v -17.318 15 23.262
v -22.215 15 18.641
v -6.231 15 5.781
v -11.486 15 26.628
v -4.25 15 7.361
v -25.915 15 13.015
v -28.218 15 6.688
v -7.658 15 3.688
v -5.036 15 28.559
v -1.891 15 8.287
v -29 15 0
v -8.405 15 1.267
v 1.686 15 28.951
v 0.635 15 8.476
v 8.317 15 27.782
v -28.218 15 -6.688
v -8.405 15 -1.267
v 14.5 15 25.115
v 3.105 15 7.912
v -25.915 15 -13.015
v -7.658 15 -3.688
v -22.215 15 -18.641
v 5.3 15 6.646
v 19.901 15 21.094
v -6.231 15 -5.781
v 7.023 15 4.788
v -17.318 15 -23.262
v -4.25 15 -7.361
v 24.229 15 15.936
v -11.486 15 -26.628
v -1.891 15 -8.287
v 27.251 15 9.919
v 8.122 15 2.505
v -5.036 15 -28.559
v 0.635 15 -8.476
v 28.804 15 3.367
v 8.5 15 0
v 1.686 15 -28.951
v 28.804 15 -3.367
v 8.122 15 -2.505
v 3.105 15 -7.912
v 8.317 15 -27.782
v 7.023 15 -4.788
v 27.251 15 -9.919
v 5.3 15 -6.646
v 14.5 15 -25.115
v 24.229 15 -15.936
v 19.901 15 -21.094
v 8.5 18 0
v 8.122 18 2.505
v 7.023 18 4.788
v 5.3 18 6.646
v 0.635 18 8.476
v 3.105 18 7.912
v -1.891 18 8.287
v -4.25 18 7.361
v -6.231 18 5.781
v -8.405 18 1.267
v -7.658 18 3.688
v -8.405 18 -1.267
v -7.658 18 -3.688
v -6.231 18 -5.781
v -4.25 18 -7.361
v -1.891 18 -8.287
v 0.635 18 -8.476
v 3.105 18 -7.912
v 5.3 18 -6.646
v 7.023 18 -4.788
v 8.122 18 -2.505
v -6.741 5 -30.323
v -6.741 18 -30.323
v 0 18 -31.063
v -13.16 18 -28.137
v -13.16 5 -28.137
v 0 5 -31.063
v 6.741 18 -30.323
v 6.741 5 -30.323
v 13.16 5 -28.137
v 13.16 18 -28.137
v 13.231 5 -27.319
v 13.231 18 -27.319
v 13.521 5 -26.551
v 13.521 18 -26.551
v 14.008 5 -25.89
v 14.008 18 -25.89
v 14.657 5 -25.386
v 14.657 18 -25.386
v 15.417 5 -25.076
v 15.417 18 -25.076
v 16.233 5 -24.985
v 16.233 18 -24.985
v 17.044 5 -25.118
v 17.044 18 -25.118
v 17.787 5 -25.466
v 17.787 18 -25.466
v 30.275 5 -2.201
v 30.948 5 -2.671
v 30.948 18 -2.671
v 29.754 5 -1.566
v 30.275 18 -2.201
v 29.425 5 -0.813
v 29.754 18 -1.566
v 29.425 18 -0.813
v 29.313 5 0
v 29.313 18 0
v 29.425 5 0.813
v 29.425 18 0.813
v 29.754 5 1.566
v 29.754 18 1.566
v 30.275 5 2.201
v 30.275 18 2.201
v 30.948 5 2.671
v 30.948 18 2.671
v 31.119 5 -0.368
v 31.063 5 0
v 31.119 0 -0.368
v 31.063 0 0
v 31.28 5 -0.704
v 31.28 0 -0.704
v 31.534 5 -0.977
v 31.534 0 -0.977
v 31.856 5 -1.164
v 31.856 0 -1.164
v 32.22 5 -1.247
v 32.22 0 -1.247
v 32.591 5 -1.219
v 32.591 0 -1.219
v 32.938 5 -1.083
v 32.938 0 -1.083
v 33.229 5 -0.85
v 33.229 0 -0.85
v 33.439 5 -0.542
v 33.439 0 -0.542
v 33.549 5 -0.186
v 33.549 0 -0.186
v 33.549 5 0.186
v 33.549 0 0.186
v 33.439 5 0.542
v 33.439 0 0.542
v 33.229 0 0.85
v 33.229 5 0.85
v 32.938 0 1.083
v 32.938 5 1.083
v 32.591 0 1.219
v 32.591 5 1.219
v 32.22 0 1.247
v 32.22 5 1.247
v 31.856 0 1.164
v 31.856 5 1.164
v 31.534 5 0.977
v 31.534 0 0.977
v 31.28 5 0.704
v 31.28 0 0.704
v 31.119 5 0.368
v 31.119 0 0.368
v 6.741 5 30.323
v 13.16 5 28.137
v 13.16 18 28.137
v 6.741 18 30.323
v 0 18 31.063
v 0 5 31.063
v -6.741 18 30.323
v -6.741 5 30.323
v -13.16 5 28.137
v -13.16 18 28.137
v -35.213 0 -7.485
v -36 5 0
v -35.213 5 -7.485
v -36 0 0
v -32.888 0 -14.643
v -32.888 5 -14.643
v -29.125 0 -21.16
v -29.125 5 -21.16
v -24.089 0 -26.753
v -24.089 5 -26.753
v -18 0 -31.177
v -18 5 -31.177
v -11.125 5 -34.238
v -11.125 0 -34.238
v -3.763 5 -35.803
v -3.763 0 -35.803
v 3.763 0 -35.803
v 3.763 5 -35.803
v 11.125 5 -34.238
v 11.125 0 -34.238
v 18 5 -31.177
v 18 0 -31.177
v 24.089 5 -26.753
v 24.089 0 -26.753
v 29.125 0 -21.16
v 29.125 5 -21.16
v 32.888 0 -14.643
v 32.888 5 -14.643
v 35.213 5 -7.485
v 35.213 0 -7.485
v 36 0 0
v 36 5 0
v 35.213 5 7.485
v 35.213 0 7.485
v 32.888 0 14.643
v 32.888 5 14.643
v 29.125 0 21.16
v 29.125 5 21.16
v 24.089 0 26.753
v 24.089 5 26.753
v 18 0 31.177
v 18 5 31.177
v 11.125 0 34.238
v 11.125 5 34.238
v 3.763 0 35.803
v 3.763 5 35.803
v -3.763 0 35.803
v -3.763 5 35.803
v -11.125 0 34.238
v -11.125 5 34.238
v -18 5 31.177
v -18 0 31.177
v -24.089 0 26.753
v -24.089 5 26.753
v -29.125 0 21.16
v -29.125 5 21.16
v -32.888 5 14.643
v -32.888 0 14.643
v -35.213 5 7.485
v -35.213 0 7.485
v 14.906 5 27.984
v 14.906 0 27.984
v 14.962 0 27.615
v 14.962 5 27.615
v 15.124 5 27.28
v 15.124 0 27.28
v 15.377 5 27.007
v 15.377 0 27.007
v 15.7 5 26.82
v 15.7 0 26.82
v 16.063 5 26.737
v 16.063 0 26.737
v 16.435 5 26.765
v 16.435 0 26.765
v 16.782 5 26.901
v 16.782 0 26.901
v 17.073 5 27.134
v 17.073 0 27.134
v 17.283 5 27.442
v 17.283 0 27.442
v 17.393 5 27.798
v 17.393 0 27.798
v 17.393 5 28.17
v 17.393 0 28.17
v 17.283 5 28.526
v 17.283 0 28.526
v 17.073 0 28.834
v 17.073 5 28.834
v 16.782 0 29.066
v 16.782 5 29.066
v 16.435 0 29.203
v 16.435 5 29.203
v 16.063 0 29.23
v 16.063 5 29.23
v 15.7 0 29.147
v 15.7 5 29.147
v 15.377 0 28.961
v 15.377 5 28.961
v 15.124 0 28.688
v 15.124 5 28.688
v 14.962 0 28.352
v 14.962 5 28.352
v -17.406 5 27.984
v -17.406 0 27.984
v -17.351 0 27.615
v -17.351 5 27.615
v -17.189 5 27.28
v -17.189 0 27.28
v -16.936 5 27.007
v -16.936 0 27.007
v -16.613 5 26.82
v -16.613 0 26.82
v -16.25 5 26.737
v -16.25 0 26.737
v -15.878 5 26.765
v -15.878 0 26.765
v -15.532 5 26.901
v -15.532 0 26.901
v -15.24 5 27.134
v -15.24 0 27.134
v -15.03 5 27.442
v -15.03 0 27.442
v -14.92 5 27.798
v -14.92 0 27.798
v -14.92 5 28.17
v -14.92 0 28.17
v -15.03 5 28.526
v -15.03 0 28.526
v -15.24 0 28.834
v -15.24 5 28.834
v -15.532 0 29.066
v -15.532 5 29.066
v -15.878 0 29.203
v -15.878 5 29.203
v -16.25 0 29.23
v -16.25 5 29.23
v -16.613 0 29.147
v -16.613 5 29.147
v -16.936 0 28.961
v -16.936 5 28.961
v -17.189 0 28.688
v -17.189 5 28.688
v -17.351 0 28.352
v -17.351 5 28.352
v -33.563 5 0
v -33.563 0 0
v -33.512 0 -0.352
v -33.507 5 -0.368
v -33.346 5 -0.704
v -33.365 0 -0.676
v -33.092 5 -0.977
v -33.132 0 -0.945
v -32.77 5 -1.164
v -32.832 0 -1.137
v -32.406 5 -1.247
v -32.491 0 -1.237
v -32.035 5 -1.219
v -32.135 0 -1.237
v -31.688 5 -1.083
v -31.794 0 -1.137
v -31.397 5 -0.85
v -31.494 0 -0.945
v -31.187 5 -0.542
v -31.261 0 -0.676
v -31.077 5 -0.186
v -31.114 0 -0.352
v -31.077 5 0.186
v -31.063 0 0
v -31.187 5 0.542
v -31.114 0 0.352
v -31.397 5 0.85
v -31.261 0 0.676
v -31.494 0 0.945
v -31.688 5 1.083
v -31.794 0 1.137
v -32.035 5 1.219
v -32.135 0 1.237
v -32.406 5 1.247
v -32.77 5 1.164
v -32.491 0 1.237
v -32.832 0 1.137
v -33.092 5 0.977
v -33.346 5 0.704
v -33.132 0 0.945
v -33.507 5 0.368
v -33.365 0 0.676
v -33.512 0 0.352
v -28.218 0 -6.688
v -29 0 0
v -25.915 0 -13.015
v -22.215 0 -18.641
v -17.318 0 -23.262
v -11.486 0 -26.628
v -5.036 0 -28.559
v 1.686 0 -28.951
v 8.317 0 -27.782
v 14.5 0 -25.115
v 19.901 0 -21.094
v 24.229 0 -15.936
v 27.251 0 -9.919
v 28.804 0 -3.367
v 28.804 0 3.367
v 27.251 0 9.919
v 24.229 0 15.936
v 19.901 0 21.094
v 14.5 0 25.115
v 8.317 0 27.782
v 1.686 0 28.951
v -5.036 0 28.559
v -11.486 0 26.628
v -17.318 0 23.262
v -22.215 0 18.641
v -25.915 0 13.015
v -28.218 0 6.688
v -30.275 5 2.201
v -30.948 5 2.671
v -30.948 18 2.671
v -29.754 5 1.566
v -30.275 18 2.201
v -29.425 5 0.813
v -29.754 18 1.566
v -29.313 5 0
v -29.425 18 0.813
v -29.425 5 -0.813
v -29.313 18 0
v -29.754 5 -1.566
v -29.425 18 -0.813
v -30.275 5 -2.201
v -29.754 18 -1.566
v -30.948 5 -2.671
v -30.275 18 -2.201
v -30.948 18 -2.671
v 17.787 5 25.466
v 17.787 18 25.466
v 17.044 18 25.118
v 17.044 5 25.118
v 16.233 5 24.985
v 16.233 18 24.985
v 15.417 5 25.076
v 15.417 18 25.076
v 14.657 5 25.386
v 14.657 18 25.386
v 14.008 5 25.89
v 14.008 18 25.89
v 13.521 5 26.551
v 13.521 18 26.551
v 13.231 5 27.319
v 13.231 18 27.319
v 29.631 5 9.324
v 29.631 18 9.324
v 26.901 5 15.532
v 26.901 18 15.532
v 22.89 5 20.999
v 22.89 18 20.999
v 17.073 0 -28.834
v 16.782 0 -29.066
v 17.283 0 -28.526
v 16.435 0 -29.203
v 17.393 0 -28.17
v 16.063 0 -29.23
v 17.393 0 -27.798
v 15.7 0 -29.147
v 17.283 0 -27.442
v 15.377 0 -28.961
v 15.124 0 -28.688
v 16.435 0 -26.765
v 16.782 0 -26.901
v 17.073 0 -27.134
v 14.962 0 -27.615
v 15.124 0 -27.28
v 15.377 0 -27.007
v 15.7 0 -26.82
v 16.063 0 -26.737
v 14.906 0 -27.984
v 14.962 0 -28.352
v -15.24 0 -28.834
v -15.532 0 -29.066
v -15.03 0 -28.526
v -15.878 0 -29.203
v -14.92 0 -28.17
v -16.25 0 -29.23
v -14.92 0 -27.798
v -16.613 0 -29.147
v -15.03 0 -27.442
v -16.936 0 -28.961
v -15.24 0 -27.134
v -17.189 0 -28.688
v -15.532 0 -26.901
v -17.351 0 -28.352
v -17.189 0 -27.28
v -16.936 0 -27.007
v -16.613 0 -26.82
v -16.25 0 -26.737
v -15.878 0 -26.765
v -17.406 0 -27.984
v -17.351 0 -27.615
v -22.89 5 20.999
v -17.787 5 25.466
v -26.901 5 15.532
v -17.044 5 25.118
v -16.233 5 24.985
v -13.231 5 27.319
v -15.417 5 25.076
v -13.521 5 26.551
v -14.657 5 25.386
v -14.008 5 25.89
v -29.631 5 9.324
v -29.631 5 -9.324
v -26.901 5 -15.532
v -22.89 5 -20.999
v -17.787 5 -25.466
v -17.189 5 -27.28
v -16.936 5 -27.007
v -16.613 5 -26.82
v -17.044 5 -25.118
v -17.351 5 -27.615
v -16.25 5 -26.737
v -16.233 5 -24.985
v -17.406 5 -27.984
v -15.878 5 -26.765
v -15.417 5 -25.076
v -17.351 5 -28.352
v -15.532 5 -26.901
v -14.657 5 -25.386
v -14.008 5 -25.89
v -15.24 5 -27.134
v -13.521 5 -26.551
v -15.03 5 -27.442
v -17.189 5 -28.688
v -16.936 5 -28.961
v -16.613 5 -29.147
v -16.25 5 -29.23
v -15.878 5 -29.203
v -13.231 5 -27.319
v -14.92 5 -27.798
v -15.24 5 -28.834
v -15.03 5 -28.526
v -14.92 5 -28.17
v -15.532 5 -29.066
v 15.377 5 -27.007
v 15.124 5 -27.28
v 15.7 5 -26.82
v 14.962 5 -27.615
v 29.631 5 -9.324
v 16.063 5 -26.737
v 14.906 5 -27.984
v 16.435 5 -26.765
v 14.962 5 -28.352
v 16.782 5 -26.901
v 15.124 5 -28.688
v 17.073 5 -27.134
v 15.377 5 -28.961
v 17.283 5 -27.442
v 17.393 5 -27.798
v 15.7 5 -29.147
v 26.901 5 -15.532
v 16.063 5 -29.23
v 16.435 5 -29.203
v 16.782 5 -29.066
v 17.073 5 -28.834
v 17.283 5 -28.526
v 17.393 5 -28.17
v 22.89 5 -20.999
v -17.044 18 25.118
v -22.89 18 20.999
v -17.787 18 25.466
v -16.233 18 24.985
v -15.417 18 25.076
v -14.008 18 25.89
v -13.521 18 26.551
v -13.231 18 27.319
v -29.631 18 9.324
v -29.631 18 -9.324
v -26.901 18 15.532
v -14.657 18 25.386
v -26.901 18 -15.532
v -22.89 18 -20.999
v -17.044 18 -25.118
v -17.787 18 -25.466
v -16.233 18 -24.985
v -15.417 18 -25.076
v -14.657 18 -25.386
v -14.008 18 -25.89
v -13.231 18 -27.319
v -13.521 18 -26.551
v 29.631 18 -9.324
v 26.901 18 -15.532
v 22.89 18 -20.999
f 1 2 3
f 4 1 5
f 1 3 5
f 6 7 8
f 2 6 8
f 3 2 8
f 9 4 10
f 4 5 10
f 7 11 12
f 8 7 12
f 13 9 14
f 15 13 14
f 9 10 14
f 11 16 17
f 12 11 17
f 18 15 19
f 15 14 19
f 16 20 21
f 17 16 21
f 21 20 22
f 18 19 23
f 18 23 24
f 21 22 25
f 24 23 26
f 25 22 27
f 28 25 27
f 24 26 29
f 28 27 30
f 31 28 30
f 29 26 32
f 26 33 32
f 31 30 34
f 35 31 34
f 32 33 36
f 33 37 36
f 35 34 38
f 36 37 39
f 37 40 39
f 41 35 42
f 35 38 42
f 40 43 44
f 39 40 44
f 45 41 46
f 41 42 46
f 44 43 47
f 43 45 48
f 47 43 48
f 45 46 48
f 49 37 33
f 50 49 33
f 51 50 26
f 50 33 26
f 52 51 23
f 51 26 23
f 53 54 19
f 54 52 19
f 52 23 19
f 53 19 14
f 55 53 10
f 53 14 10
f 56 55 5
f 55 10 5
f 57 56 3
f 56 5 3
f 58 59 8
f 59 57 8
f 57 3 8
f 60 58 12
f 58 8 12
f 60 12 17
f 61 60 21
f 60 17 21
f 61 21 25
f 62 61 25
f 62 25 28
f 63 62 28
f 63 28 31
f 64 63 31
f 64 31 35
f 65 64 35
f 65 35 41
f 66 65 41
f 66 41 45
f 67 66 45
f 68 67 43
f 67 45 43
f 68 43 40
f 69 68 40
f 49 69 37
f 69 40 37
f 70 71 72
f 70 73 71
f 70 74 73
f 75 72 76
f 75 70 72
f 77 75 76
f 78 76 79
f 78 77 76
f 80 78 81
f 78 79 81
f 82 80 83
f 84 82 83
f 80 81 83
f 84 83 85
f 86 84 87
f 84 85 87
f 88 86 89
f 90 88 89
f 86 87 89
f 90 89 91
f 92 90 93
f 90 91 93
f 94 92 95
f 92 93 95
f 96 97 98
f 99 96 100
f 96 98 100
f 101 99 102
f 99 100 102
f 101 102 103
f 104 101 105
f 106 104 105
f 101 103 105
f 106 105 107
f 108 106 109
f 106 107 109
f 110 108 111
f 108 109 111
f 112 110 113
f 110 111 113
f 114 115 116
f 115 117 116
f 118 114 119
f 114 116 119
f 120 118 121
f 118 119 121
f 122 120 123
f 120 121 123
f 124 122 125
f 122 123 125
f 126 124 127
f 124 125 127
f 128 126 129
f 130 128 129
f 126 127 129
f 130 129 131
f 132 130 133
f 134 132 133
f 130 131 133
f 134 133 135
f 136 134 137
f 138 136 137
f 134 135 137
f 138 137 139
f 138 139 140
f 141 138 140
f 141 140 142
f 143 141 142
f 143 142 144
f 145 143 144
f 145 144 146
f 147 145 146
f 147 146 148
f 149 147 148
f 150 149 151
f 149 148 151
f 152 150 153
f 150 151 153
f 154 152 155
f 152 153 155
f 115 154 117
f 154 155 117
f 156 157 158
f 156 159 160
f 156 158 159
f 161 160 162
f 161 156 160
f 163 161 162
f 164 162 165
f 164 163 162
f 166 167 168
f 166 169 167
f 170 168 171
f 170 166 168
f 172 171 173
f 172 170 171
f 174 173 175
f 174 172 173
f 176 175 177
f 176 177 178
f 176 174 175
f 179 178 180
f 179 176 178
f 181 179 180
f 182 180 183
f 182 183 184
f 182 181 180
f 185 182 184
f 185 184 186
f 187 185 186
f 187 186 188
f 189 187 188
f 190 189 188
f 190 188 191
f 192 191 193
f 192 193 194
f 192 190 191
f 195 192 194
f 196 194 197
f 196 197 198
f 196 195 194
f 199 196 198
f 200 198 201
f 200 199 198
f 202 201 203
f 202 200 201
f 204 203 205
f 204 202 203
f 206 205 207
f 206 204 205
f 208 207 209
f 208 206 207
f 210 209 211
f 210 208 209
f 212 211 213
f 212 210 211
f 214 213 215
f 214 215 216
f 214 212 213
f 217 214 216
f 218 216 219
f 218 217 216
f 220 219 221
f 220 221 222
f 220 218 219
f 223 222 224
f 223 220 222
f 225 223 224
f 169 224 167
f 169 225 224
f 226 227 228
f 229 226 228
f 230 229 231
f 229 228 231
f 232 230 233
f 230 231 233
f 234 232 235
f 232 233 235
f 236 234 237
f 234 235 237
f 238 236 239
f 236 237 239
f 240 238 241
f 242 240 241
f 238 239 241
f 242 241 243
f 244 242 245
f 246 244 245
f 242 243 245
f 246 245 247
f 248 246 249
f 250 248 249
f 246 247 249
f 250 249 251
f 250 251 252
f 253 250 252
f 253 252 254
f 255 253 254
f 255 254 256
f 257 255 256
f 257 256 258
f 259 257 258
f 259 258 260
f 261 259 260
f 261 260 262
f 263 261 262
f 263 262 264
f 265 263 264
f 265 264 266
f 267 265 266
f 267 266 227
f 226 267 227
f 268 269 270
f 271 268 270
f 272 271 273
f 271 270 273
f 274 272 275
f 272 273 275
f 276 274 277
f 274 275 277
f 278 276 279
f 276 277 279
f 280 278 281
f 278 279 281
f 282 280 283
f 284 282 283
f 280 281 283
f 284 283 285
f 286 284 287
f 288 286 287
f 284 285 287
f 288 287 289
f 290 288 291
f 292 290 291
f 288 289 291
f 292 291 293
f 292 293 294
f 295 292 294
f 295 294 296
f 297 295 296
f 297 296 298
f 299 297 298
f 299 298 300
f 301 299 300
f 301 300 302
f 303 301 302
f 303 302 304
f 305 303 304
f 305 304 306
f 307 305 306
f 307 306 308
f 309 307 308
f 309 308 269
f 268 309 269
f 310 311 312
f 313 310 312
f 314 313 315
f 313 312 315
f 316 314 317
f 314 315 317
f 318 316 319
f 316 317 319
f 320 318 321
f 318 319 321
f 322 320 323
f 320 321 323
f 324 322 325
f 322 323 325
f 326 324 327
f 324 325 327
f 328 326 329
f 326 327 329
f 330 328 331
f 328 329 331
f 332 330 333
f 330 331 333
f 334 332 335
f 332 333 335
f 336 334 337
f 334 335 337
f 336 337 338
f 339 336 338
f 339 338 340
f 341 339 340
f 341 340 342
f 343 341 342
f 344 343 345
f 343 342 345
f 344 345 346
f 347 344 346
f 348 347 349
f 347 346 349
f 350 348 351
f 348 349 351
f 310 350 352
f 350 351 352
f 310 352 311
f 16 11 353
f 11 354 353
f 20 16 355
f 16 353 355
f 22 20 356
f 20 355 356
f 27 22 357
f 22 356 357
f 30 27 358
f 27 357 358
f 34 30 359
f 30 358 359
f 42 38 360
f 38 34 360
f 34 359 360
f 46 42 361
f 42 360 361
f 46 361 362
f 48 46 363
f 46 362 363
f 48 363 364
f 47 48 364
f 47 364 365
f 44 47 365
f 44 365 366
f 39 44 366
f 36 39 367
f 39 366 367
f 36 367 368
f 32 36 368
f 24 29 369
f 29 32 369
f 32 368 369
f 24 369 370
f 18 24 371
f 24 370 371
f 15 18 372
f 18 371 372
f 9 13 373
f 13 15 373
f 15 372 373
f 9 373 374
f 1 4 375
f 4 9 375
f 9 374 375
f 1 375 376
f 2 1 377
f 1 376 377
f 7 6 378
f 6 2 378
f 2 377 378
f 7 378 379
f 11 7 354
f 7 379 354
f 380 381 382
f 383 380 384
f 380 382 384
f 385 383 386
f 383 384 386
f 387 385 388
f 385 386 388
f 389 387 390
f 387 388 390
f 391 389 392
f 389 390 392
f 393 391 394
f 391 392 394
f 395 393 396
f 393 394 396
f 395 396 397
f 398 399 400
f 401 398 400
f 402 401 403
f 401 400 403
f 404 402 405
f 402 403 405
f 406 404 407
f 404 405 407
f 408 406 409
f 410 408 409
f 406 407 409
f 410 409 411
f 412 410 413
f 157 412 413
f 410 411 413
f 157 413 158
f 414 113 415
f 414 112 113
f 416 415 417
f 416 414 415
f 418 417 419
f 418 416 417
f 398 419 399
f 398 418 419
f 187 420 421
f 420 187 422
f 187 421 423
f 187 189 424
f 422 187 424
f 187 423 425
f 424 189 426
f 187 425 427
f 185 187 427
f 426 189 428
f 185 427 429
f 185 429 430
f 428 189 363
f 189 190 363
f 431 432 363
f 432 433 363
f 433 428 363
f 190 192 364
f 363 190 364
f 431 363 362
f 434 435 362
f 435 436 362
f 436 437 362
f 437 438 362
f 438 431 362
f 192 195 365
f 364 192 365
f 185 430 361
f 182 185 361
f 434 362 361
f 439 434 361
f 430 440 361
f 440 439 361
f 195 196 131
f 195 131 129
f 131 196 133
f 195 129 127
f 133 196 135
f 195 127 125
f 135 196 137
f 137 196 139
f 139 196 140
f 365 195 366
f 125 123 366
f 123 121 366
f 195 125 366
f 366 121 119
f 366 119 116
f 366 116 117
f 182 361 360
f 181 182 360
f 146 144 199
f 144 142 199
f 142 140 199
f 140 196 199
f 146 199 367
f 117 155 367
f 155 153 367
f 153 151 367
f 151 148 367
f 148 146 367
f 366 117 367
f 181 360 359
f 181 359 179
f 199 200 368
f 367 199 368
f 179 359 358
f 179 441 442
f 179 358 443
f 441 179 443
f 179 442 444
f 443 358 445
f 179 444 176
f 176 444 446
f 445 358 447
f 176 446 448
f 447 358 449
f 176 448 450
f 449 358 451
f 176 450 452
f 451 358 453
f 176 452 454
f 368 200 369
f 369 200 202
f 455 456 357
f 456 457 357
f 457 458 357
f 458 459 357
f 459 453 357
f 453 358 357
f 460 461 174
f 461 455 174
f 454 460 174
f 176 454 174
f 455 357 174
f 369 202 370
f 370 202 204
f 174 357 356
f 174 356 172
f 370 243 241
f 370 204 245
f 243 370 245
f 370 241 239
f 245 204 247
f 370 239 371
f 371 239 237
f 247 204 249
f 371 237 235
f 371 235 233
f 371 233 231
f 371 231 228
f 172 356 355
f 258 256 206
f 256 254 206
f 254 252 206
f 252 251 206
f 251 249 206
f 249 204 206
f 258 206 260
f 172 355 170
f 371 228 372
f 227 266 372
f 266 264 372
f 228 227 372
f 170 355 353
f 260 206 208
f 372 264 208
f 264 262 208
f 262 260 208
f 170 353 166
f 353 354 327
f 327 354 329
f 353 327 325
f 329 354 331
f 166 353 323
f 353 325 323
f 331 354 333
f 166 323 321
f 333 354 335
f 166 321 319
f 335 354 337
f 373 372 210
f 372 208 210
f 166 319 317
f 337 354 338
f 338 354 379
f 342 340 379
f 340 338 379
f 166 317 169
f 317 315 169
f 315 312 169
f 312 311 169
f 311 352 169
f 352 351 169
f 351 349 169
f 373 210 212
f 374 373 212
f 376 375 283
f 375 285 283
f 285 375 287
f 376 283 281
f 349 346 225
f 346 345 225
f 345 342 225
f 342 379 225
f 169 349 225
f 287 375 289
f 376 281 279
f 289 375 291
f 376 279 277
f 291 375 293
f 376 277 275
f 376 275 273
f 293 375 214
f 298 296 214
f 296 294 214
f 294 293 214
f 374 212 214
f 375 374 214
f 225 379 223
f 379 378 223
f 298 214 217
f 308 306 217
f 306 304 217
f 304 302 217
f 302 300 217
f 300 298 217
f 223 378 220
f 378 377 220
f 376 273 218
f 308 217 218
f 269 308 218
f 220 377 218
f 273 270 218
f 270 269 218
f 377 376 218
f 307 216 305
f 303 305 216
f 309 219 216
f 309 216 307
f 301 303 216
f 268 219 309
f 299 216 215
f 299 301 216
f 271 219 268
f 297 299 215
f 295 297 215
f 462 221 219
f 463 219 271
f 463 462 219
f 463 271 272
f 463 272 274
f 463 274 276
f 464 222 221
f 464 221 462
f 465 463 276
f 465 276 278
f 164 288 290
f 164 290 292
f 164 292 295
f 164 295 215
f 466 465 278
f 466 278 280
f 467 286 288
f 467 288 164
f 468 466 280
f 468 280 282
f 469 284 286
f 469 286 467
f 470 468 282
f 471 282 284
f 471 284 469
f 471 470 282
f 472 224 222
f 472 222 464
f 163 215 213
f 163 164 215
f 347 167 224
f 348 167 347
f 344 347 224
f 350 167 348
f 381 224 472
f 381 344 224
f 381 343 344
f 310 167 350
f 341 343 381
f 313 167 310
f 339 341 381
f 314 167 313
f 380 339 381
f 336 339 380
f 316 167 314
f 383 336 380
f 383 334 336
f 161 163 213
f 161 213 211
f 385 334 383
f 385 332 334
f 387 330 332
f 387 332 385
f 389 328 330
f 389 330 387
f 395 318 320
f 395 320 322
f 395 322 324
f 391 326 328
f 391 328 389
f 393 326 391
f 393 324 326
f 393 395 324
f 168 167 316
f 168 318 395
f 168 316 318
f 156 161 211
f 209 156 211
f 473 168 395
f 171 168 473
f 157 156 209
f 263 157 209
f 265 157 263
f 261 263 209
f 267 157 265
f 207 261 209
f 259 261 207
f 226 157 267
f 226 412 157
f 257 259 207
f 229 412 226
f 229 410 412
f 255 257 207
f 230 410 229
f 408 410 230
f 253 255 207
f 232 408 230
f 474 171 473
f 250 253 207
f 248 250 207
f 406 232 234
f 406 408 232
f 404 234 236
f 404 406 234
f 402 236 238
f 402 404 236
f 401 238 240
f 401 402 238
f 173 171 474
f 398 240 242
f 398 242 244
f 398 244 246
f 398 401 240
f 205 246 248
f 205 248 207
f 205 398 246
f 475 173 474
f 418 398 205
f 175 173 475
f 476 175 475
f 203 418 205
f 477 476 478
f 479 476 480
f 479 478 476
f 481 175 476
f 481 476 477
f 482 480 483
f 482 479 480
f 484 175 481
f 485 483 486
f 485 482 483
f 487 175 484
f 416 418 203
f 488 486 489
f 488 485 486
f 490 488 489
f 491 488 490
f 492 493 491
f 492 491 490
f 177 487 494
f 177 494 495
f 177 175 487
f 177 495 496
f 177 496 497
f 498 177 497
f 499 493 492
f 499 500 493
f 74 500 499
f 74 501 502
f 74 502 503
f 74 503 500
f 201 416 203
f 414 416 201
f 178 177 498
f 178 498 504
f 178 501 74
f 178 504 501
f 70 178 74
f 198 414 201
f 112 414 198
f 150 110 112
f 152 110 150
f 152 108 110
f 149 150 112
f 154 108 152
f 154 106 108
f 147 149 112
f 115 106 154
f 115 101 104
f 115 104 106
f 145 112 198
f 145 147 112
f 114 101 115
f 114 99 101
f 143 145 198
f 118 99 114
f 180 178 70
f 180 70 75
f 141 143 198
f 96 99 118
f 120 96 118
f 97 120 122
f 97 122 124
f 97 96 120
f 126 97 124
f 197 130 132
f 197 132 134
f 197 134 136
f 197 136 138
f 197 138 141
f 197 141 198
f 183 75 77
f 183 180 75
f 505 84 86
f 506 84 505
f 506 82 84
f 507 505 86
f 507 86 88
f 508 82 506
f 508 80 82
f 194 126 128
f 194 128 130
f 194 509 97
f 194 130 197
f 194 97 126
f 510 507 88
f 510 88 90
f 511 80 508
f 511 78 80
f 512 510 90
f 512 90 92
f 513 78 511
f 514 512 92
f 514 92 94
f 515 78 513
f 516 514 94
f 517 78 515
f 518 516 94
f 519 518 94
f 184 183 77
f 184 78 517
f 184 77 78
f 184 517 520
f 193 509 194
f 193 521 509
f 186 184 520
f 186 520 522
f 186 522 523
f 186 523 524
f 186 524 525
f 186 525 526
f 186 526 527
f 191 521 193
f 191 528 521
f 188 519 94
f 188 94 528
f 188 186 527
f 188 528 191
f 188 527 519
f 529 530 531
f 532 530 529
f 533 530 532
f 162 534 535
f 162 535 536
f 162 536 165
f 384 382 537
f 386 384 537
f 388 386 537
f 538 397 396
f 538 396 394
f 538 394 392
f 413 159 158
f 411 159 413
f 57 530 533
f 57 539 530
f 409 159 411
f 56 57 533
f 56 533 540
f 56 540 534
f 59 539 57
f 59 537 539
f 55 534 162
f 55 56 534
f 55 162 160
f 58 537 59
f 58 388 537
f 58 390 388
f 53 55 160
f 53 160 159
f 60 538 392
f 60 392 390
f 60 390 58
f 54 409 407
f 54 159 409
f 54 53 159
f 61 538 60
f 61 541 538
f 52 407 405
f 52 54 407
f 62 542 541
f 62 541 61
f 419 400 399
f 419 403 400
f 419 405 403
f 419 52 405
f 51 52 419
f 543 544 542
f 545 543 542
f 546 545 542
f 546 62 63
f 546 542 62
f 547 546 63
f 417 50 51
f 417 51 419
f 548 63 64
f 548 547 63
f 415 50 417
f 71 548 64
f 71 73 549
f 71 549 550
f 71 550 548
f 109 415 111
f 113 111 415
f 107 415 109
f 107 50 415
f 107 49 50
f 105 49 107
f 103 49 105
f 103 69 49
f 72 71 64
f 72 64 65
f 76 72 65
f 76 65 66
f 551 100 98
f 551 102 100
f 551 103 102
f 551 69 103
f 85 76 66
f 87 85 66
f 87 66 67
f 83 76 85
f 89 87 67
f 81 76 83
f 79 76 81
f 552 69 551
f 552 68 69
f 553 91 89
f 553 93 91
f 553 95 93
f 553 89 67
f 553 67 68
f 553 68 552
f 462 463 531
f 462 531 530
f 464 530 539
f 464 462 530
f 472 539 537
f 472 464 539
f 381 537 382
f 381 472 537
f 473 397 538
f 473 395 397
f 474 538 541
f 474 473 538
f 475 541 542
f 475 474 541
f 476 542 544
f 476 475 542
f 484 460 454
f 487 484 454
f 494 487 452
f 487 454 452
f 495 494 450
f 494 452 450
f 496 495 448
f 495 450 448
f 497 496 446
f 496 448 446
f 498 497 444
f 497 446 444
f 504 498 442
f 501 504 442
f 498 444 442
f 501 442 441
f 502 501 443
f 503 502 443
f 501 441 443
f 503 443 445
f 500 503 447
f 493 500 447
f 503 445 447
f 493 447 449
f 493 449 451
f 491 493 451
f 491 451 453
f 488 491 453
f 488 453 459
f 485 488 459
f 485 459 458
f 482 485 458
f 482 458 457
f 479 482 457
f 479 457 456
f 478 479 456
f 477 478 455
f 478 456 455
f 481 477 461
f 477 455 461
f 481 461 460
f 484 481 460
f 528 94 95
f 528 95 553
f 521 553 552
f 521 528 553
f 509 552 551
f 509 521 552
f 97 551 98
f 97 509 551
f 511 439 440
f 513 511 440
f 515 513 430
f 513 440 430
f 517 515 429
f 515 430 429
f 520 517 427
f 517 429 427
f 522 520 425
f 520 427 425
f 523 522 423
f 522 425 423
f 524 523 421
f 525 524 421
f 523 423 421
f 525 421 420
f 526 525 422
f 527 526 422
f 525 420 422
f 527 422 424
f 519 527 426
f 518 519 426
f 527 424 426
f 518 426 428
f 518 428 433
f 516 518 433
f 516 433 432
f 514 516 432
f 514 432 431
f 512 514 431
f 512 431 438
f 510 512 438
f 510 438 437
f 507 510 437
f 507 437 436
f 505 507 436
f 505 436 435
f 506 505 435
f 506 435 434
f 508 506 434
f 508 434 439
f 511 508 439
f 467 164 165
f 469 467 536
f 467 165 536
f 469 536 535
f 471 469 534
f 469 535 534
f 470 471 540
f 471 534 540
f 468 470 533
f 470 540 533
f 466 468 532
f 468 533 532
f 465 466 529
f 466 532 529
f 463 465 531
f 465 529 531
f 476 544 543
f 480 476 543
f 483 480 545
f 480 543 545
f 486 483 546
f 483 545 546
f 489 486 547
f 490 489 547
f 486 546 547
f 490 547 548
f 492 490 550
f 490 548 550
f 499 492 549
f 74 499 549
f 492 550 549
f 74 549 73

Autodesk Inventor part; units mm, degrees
ref_plane "YZ Plane" through (0, 0, 0) normal (1, 0, 0) x (0, 1, 0)
ref_plane "XZ Plane" through (0, 0, 0) normal (0, 1, 0) x (-1, 0, 0)
ref_plane "XY Plane" through (0, 0, 0) normal (0, 0, 1) x (1, 0, 0)
sketch "Sketch1" plane through (0, 0, 0) normal (0, 1, 0) x (-1, 0, 0)
  circle A0 centre (0, 0) radius 36
  circle A1 centre (0, 0) radius 29
  line L0 (0, 0) -> (32.313, 0)
  circle A2 centre (32.313, 0) radius 1.25
  circle A3 centre (16.1565, 27.9839) radius 1.25
  circle A4 centre (-16.1565, 27.9839) radius 1.25
  circle A5 centre (-32.313, 0) radius 1.25
  circle A6 centre (-16.1565, -27.9839) radius 1.25
  circle A7 centre (16.1565, -27.9839) radius 1.25
  dimension "d0" = 72
  dimension "d1" = 58
  dimension "d2" = 32.313
  dimension "d3" = 2.5
  dimension "d6" = 360
extrude "Extrusion1" add sketch "Sketch1" along normal blind 15
sketch "Sketch2" plane through (0, 15, 0) normal (0, 1, 0) x (1, 0, 0)
  circle A0 centre (0, 0) radius 29
  circle A1 centre (0, 0) radius 31.063
  circle A2 centre (-16.1565, 27.9839) radius 1.25 projected
  circle A3 centre (0, 0) radius 36
  point P0 (-15.5315, 26.9013)
extrude "Extrusion2" cut sketch "Sketch2" against normal blind 10 contours A3
sketch "Sketch3" plane through (0, 15, 0) normal (0, 1, 0) x (1, 0, 0)
  circle A0 centre (0, 0) radius 31.063
  circle A1 centre (0, 0) radius 8.5
  dimension "d12" = 17
extrude "Extrusion3" add sketch "Sketch3" along normal blind 3
sketch "Sketch4" plane through (0, 18, 0) normal (0, 1, 0) x (1, 0, 0)
  circle A0 centre (-32.313, 0) radius 1.25 projected
  circle A1 centre (-32.313, 0) radius 3
  circle A2 centre (0, 0) radius 8.5
  circle A3 centre (-16.1565, -27.9839) radius 3
  circle A4 centre (16.1565, -27.9839) radius 3
  circle A5 centre (32.313, 0) radius 3
  circle A6 centre (16.1565, 27.9839) radius 3
  circle A7 centre (-16.1565, 27.9839) radius 3
  dimension "d15" = 6
  dimension "d18" = 360
extrude "Extrusion4" cut sketch "Sketch4" against normal up to surface (13 mm away) contours A0 | A1 | A3 | A4 | A5 | A6 | A7
properties part number "Stage_1_Lid"
